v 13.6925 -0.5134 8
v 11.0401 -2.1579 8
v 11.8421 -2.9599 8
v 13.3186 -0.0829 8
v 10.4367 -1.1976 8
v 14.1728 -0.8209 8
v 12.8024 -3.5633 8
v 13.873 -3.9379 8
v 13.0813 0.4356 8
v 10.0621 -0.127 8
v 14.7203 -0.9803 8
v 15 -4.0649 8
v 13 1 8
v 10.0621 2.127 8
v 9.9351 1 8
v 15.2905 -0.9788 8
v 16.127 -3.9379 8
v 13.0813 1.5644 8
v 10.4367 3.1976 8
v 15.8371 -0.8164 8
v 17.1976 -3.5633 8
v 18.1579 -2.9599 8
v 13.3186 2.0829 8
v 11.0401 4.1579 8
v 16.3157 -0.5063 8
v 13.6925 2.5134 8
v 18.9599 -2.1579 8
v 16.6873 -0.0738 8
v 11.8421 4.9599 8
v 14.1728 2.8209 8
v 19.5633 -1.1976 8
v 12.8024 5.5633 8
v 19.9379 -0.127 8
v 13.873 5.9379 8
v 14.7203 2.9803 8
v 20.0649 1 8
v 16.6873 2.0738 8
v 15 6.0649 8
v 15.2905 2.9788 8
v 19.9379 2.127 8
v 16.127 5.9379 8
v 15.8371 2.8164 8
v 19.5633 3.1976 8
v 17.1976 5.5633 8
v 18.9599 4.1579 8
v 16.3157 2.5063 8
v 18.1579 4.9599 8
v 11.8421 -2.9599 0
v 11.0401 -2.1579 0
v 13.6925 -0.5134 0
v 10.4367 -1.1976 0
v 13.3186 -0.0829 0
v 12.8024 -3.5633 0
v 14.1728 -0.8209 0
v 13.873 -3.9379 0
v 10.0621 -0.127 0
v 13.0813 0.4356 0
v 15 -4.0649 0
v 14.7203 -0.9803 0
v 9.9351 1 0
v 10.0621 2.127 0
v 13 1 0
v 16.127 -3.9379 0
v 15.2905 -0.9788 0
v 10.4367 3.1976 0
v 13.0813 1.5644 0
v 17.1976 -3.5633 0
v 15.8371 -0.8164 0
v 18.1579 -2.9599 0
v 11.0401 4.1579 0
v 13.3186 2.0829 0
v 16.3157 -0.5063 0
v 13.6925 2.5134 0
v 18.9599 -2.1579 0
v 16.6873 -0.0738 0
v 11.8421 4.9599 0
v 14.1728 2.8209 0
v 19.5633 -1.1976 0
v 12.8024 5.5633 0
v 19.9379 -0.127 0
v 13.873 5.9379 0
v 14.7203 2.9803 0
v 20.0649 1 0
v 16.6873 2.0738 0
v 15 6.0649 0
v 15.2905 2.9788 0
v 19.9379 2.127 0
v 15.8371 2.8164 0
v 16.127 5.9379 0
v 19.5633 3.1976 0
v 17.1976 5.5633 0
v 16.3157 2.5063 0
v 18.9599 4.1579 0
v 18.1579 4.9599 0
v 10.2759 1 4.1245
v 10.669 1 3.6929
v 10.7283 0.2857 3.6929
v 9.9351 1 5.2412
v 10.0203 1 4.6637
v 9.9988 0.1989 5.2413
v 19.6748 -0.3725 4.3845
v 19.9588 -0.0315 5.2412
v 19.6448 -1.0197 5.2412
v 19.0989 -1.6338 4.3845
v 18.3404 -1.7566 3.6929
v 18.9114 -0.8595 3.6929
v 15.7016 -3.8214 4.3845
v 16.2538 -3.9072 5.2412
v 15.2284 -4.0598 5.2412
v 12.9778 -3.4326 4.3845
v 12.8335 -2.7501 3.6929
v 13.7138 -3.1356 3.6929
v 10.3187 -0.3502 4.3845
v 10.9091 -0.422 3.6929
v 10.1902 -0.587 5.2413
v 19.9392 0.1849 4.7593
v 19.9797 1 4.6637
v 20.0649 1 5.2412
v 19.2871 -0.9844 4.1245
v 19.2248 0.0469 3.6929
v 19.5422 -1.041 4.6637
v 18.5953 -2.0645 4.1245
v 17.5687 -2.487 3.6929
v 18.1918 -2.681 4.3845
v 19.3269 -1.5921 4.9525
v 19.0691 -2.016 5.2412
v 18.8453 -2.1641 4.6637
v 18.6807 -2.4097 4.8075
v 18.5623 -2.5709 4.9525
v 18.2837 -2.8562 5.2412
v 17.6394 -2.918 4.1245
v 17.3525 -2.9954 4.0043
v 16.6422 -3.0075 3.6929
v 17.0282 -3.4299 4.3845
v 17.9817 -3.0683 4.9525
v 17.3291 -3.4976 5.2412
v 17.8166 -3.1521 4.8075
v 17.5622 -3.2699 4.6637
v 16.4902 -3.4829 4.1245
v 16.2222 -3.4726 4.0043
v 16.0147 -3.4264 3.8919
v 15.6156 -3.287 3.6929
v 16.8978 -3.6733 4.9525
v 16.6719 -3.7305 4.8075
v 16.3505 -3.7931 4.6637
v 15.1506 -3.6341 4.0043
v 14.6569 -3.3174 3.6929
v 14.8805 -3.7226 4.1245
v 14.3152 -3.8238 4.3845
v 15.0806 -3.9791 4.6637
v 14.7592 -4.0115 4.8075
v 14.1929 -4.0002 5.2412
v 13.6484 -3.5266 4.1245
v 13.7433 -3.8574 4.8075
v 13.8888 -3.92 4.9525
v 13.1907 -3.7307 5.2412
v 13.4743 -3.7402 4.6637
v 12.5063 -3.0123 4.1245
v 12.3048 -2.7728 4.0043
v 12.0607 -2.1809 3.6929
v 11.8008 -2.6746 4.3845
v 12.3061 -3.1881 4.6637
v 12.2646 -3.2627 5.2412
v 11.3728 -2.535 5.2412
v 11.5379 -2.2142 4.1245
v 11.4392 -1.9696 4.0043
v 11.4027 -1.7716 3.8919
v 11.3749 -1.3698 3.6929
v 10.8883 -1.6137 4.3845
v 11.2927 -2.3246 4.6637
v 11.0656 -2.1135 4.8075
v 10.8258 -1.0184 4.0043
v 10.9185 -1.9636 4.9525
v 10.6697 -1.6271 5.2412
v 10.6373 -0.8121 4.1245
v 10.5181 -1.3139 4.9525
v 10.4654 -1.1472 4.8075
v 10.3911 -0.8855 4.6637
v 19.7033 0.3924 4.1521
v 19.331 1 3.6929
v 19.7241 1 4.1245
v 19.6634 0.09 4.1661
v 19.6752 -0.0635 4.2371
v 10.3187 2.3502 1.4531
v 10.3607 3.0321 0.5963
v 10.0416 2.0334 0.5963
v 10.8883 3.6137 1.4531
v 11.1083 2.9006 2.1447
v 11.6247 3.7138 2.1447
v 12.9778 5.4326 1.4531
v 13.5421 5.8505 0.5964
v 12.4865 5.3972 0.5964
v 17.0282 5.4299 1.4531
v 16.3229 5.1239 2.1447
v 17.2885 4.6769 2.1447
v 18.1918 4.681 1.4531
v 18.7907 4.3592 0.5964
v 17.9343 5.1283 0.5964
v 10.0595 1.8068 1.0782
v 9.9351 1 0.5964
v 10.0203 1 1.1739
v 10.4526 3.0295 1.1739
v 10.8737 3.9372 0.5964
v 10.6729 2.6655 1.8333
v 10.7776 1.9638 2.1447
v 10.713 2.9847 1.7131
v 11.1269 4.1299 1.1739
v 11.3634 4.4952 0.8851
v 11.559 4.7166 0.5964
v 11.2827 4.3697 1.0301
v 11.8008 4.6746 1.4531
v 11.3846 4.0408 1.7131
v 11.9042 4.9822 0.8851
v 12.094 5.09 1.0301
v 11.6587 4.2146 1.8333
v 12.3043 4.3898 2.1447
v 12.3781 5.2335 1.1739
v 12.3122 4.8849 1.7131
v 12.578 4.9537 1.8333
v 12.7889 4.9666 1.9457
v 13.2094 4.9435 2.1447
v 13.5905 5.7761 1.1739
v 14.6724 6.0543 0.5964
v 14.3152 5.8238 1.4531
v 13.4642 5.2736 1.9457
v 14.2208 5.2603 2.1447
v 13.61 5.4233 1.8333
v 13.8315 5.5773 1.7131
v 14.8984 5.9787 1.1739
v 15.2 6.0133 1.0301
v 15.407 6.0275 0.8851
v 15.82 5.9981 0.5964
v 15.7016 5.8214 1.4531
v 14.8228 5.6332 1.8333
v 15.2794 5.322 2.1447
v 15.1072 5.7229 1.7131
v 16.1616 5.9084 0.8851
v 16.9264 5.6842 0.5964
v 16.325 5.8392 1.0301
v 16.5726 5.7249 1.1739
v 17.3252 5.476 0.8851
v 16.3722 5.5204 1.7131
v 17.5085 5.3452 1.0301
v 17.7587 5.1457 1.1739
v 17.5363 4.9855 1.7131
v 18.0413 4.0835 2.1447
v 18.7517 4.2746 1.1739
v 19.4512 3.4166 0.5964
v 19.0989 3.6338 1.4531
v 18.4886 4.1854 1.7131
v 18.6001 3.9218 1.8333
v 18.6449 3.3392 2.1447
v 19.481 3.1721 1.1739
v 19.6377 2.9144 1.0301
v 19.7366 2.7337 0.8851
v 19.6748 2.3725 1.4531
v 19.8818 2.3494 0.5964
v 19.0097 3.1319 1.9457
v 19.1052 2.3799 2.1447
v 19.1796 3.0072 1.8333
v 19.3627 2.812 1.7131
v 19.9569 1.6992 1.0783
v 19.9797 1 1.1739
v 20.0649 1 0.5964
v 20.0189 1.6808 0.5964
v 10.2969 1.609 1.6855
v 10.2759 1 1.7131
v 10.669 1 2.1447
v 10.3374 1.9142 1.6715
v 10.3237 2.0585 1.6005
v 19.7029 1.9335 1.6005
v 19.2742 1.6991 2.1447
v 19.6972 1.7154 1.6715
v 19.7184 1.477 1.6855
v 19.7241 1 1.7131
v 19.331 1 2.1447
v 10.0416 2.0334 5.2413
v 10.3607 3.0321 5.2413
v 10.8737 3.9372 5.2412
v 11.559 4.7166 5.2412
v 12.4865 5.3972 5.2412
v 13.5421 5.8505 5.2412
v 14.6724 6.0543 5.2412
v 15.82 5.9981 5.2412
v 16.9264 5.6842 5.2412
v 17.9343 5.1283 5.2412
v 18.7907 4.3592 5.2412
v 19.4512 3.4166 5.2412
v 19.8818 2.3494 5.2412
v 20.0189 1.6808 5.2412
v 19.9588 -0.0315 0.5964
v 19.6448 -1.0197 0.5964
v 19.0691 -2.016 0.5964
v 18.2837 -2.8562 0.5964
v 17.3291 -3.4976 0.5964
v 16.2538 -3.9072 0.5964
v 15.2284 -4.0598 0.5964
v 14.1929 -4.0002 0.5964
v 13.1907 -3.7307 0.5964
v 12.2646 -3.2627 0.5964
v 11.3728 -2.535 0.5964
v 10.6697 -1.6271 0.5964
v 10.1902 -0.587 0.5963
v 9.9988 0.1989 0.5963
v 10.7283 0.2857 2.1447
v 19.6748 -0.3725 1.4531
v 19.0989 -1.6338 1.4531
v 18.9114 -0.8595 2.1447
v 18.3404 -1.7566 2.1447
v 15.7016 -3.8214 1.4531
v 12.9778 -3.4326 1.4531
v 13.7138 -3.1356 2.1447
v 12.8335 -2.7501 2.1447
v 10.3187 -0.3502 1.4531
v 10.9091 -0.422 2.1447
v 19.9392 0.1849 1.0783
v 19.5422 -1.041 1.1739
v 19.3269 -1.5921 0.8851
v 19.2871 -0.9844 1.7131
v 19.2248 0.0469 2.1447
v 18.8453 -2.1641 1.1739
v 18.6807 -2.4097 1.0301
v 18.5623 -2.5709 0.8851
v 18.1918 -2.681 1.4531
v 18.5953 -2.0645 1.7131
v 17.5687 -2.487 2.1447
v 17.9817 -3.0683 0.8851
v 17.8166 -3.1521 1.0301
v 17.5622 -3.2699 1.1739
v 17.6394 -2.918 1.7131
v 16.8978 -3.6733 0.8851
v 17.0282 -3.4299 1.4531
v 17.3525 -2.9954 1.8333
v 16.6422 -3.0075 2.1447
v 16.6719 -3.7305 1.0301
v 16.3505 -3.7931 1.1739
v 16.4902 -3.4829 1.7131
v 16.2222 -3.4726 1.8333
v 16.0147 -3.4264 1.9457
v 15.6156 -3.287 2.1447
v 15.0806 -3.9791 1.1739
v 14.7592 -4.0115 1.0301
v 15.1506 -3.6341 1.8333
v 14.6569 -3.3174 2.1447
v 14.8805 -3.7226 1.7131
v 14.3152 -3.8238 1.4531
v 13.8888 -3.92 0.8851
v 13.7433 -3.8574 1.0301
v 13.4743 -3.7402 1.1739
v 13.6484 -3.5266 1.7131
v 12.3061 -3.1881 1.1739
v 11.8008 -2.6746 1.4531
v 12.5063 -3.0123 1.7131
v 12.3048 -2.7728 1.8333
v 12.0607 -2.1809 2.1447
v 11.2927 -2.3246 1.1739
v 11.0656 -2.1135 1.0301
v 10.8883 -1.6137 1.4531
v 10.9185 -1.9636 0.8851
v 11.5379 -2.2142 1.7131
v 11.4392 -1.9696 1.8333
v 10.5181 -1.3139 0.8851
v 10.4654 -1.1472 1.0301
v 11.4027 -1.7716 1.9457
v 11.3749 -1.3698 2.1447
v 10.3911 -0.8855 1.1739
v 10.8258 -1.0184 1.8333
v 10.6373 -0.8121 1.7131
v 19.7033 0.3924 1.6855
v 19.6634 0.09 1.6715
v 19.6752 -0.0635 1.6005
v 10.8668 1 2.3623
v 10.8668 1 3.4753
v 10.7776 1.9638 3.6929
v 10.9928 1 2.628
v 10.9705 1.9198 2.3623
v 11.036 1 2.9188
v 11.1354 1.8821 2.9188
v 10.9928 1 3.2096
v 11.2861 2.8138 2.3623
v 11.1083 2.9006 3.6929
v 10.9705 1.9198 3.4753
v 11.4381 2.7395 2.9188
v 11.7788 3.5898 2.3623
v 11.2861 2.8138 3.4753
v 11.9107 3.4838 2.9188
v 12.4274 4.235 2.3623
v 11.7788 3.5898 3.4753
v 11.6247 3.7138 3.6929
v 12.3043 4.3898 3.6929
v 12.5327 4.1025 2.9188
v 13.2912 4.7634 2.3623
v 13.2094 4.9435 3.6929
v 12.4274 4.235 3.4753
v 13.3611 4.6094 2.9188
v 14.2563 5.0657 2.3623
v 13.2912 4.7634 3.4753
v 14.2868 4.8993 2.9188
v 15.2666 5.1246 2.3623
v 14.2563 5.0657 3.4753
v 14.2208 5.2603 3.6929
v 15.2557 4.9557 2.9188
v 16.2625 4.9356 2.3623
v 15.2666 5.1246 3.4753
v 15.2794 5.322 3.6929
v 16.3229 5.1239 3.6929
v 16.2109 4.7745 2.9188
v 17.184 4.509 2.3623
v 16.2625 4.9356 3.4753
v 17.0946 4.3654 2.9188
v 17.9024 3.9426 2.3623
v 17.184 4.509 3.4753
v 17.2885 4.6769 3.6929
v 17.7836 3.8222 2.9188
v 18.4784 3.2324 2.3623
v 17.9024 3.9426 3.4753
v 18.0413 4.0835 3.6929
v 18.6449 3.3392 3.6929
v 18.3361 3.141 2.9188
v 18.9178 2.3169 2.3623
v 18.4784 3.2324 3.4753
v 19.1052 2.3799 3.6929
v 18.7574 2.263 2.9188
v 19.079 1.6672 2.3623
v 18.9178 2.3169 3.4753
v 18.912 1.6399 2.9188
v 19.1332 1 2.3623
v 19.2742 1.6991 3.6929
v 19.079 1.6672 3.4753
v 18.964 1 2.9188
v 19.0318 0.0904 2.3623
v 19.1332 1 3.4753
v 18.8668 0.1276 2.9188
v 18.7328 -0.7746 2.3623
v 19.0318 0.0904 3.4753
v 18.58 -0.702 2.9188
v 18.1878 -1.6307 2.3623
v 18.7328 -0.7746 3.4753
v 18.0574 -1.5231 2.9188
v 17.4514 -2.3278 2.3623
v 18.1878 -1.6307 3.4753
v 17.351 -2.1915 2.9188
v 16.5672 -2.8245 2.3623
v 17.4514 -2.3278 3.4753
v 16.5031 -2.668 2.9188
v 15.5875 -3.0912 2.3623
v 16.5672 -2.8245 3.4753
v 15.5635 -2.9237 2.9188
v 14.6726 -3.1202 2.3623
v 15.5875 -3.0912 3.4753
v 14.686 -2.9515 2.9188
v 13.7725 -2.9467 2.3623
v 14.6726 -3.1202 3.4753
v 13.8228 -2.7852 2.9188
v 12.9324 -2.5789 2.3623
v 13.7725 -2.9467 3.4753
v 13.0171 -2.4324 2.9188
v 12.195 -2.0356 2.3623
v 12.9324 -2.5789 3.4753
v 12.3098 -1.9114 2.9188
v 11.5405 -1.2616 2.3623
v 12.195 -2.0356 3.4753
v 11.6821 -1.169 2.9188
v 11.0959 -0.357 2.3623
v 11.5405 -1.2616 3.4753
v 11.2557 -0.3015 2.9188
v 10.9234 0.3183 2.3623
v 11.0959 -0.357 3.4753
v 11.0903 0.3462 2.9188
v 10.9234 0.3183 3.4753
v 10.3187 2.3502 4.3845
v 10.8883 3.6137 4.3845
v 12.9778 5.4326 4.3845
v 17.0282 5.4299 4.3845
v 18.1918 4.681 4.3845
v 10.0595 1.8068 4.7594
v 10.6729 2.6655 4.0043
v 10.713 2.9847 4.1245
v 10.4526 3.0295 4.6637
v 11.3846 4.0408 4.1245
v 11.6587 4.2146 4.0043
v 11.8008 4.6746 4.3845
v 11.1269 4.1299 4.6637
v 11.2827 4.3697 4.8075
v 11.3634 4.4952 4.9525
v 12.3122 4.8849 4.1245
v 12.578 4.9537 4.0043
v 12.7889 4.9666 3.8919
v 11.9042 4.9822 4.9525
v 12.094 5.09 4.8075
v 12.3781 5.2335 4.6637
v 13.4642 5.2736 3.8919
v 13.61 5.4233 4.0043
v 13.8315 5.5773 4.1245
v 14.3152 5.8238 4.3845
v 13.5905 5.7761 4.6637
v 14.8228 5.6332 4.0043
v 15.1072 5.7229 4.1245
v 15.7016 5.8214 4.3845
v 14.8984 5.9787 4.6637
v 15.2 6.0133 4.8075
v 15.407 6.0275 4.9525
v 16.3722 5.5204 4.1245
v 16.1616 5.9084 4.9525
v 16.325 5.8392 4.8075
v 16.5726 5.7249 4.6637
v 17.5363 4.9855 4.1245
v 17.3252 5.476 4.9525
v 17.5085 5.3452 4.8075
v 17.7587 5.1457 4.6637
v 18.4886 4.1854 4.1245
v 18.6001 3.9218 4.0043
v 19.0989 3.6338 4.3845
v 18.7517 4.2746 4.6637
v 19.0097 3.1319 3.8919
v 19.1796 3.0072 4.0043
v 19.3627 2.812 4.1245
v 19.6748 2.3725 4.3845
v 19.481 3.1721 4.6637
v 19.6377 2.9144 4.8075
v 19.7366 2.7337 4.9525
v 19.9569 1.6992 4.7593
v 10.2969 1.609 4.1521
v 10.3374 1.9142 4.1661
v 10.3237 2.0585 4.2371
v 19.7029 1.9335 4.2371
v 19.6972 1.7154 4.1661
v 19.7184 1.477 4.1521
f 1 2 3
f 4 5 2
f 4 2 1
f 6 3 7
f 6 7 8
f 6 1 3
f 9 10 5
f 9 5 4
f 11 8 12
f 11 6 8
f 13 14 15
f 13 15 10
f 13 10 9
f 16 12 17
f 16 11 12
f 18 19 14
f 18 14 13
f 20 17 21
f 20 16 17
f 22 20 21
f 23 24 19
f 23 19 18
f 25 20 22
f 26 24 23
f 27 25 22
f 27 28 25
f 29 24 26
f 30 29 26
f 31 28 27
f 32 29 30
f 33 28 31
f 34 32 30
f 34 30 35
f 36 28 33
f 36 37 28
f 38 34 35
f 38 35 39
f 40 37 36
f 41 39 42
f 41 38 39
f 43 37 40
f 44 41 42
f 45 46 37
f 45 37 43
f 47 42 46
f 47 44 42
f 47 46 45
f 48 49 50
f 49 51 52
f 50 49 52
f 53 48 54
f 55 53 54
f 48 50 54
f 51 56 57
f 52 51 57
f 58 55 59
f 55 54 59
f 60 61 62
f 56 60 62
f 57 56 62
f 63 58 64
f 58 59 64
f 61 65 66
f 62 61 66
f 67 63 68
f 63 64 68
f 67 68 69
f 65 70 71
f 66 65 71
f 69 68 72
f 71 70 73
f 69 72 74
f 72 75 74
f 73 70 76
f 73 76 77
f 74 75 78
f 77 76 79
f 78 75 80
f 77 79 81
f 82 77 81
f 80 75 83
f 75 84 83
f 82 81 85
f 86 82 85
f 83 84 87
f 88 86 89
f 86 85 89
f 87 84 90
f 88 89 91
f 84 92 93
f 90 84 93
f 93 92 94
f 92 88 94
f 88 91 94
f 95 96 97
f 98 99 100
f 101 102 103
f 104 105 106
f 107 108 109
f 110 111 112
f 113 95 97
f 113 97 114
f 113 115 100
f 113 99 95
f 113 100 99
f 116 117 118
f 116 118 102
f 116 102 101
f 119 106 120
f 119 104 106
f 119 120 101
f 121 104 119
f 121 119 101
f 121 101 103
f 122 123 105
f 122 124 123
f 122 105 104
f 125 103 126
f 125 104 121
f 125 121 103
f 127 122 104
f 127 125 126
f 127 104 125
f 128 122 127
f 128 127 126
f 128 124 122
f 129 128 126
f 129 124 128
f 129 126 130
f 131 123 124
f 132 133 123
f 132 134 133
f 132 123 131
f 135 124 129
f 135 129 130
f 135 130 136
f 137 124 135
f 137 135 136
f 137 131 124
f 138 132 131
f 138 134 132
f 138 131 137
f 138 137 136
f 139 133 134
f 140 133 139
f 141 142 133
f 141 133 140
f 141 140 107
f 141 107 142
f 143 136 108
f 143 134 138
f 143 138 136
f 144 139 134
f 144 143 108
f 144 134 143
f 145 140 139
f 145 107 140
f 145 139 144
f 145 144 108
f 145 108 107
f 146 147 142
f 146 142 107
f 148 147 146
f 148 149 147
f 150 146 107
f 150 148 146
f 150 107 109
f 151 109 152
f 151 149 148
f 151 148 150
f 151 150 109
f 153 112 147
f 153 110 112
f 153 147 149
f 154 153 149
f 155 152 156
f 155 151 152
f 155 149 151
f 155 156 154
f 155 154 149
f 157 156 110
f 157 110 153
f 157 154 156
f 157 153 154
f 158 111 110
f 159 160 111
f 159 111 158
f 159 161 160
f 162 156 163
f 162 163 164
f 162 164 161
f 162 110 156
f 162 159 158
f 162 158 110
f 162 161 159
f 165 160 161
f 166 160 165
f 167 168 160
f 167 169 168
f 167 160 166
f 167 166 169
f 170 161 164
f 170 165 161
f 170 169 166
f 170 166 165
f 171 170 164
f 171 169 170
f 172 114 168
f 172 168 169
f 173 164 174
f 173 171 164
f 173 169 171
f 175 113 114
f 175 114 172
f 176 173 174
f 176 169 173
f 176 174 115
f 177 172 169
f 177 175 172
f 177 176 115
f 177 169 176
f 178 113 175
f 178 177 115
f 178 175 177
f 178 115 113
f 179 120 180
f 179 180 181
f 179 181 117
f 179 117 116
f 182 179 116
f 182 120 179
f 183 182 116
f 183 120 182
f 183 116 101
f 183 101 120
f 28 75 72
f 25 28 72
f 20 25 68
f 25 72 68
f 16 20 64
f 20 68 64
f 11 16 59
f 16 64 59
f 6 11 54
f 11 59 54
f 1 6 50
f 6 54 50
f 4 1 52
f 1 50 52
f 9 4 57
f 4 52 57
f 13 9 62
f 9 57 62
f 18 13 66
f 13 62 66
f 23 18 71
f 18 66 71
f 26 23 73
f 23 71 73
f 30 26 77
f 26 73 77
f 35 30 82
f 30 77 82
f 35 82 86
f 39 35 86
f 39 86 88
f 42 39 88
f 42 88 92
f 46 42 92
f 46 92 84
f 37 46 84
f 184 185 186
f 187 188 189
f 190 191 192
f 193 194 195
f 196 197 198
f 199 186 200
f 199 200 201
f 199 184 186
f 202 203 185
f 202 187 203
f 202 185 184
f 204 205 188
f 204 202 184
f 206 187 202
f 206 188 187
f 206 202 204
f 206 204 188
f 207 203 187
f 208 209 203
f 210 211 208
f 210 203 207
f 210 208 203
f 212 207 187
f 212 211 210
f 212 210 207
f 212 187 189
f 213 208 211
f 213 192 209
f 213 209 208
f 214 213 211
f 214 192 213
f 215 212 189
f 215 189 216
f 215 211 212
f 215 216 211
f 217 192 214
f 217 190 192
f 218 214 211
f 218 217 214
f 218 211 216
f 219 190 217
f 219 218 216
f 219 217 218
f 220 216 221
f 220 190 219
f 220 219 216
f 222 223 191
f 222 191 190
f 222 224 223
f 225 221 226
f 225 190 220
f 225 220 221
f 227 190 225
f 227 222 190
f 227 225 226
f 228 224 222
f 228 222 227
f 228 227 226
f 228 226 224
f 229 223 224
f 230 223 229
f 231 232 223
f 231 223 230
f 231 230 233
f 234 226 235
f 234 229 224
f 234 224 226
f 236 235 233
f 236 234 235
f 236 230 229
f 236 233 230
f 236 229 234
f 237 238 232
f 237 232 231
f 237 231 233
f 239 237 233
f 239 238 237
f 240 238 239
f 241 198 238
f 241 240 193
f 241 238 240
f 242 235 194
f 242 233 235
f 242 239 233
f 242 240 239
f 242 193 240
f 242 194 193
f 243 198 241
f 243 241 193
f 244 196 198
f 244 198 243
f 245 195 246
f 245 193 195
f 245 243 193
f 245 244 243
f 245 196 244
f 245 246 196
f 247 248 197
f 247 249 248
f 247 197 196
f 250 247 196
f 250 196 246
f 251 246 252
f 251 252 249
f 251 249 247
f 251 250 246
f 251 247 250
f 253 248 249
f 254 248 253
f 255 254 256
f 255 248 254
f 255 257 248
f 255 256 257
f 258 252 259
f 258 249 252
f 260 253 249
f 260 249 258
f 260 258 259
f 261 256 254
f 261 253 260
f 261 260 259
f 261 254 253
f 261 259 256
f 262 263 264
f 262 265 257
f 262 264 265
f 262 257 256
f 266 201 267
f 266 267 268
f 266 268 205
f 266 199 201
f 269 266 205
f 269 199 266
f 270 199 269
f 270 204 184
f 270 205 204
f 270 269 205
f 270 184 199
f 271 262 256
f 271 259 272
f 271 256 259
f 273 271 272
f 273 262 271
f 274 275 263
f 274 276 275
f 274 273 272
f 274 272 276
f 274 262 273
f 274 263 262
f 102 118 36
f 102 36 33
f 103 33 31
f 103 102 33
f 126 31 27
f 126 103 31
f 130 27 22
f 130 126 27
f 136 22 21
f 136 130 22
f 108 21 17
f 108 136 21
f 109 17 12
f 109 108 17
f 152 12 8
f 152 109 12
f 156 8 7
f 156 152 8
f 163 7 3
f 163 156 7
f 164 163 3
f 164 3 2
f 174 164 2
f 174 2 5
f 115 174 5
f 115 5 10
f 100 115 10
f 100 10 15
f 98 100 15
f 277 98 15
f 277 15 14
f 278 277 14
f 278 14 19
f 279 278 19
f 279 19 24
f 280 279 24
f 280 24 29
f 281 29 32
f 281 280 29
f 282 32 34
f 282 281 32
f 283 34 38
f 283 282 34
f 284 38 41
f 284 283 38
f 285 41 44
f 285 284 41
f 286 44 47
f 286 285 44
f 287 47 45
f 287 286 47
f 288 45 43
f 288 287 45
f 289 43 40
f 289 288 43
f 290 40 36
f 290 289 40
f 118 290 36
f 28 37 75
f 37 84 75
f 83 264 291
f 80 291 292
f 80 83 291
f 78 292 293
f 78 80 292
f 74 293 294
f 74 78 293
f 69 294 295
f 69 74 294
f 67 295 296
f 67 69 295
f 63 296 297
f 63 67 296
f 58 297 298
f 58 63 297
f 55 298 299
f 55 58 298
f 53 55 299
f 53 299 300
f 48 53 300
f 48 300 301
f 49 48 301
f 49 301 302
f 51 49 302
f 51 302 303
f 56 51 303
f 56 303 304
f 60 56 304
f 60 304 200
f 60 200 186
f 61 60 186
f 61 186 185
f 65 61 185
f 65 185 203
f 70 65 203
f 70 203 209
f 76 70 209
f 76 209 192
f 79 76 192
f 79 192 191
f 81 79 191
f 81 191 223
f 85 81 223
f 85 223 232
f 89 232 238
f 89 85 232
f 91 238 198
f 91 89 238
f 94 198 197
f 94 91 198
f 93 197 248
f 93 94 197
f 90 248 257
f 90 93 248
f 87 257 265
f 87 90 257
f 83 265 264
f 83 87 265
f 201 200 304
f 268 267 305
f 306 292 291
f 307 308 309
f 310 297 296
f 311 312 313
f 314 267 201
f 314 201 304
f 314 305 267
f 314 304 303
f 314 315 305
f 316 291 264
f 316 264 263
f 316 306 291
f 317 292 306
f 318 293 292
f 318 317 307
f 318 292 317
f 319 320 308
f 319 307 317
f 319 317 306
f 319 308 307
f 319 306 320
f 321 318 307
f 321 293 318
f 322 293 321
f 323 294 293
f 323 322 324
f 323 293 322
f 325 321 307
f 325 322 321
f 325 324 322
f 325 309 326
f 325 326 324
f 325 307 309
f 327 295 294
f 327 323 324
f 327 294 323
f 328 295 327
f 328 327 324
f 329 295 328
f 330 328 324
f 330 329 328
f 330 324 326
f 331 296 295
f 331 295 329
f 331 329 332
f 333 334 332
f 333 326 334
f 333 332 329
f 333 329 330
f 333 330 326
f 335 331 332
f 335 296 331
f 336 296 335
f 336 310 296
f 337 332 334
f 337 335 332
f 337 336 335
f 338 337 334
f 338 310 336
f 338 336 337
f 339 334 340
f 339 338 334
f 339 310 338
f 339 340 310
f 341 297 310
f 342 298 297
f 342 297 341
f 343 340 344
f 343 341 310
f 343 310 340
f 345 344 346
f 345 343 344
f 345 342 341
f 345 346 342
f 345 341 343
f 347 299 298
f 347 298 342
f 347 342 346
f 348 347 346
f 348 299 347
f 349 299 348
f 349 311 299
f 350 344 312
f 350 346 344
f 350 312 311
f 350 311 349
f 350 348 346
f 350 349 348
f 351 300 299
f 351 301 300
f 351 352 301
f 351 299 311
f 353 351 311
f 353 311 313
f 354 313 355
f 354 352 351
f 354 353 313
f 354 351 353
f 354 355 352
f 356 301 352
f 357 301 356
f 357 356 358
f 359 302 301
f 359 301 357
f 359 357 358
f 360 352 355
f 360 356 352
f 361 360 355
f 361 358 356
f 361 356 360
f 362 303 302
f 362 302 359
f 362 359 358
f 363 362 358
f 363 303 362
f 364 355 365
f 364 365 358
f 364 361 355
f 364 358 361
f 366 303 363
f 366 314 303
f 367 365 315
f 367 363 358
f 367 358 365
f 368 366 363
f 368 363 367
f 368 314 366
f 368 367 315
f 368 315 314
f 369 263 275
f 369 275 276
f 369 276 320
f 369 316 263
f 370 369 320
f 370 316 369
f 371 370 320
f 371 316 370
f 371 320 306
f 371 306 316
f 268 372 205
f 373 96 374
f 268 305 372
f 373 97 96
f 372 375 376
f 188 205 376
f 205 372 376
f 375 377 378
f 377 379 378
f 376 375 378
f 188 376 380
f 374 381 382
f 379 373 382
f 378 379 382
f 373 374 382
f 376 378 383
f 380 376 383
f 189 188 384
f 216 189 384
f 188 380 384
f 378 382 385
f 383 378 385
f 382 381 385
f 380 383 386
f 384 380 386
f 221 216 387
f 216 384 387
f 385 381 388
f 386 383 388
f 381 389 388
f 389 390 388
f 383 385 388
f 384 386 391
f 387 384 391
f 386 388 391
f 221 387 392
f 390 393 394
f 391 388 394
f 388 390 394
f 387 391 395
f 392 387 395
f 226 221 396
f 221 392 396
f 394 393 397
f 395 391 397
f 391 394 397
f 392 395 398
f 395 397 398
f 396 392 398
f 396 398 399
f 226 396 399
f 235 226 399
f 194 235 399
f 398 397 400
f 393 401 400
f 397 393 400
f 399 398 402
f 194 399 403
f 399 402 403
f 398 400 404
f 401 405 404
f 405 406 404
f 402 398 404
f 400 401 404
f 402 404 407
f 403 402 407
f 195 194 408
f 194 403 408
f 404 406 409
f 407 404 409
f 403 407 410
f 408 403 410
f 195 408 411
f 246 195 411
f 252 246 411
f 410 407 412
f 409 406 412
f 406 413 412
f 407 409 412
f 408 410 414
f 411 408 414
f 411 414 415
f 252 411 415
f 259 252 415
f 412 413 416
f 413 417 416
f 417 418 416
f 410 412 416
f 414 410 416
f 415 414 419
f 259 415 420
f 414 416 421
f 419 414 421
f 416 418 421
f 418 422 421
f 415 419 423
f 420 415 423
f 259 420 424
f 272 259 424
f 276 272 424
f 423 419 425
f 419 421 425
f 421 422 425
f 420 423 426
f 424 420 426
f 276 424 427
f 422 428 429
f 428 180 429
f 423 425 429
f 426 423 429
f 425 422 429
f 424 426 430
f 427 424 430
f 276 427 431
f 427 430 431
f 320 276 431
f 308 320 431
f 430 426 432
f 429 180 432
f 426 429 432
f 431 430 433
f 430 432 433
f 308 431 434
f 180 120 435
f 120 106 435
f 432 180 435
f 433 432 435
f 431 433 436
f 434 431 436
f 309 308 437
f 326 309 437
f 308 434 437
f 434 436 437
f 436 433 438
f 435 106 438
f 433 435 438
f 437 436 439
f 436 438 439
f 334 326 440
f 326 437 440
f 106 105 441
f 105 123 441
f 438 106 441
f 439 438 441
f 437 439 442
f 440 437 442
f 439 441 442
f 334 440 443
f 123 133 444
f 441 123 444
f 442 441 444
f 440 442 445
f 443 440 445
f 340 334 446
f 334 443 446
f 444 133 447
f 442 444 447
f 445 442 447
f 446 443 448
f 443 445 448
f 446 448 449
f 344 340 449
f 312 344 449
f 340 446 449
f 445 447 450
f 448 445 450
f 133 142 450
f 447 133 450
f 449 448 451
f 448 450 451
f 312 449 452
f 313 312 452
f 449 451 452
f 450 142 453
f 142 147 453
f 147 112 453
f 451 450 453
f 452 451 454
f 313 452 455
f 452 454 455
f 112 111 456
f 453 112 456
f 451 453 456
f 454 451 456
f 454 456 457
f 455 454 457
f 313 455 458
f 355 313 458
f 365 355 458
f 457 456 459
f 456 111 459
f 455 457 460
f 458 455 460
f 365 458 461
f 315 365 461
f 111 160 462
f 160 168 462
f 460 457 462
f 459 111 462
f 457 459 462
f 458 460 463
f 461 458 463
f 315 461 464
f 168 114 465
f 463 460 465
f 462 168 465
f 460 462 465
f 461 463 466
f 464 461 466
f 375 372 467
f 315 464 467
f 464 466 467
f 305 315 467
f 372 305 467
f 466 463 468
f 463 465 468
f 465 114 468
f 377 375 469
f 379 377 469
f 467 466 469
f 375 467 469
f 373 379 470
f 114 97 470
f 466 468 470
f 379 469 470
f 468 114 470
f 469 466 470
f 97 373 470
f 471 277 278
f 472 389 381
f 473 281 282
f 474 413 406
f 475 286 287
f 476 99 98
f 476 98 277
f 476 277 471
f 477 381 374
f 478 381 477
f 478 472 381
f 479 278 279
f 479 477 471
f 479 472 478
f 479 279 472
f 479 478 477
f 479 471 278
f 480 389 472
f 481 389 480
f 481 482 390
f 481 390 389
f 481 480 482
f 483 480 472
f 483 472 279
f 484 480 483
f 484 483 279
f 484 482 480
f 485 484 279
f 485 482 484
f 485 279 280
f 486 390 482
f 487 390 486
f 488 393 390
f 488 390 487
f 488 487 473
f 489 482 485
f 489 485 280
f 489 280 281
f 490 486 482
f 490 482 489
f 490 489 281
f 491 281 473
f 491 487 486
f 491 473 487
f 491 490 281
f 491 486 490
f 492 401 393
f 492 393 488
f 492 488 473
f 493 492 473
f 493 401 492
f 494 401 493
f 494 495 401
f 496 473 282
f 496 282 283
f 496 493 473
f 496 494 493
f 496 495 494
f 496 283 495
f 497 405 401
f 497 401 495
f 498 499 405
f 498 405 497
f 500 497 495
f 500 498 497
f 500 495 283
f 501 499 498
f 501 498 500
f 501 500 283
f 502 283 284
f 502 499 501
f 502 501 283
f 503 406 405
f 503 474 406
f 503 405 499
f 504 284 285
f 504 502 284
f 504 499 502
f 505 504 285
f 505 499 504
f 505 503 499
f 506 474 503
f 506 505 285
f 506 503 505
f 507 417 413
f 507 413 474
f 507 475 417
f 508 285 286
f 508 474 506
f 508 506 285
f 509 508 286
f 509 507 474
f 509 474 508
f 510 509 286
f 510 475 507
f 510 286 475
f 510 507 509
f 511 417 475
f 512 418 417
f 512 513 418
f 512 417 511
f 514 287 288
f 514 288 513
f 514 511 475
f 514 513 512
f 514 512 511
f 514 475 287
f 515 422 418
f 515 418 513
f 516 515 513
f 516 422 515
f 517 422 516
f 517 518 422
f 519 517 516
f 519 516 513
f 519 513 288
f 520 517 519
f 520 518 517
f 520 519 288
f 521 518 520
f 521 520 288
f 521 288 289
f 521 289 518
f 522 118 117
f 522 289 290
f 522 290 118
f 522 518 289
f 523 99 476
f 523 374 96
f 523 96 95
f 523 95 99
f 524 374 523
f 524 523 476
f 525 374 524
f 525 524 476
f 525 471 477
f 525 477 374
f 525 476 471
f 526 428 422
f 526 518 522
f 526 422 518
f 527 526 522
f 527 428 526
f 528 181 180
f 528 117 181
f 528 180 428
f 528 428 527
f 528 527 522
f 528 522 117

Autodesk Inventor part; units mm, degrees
ref_plane "YZ Plane" through (0, 0, 0) normal (1, 0, 0) x (0, 1, 0)
ref_plane "XZ Plane" through (0, 0, 0) normal (0, 1, 0) x (-1, 0, 0)
ref_plane "XY Plane" through (0, 0, 0) normal (0, 0, 1) x (1, 0, 0)
ref_plane "Work Plane1" through (0, 0, 0) normal (0, 0, 1) x (1, 0, 0)
sketch "Sketch1" plane through (0, 0, 0) normal (0, 0, 1) x (1, 0, 0)
  circle A0 centre (33.5, -2.875) radius 5.0649 projected
  circle A1 centre (15, 1) radius 5.0649
  arc A2 (16.6873, 2.0738) -> (16.6873, -0.0738) centre (15, 1) ccw
  line L0 (16.6873, 2.0738) -> (16.6873, -0.0738)
  point P0 (0, 0)
  dimension "d4" = 4
extrude "Extrusion1" add sketch "Sketch1" along normal blind 8 contours A1
ref_plane "Work Plane2" through (23.5, 1, -28) normal (0, -1, 0) x (0, 0, 1)
sketch "Sketch2" plane through (23.5, 1, -28) normal (0, -1, 0) x (0, 0, 1)
  arc A0 (30.1735, -5.6017) -> (31.6642, -5.6017) centre (30.9188, -4.9351) ccw
  circle A1 centre (30.9188, 13.464) radius 1
  line L0 (26.4, 8.5) -> (37.6, 8.5) projected
  point P0 (28, 23.5)
revolve "Revolution1" cut sketch "Sketch2" angle 360 about axis through (15, 1, 0) along (0, 0, 1)
fillet "Fillet1" radius 2 4 edges at (15, -4.0649, 1.9239) (15, 6.0649, 1.9239) (15, -4.0649, 3.9137) (15, 6.0649, 3.9137)
properties part number "20_Cube_Insert_Lightsheet_FEPTube_Rotating_hollomotor_driver_v0"
